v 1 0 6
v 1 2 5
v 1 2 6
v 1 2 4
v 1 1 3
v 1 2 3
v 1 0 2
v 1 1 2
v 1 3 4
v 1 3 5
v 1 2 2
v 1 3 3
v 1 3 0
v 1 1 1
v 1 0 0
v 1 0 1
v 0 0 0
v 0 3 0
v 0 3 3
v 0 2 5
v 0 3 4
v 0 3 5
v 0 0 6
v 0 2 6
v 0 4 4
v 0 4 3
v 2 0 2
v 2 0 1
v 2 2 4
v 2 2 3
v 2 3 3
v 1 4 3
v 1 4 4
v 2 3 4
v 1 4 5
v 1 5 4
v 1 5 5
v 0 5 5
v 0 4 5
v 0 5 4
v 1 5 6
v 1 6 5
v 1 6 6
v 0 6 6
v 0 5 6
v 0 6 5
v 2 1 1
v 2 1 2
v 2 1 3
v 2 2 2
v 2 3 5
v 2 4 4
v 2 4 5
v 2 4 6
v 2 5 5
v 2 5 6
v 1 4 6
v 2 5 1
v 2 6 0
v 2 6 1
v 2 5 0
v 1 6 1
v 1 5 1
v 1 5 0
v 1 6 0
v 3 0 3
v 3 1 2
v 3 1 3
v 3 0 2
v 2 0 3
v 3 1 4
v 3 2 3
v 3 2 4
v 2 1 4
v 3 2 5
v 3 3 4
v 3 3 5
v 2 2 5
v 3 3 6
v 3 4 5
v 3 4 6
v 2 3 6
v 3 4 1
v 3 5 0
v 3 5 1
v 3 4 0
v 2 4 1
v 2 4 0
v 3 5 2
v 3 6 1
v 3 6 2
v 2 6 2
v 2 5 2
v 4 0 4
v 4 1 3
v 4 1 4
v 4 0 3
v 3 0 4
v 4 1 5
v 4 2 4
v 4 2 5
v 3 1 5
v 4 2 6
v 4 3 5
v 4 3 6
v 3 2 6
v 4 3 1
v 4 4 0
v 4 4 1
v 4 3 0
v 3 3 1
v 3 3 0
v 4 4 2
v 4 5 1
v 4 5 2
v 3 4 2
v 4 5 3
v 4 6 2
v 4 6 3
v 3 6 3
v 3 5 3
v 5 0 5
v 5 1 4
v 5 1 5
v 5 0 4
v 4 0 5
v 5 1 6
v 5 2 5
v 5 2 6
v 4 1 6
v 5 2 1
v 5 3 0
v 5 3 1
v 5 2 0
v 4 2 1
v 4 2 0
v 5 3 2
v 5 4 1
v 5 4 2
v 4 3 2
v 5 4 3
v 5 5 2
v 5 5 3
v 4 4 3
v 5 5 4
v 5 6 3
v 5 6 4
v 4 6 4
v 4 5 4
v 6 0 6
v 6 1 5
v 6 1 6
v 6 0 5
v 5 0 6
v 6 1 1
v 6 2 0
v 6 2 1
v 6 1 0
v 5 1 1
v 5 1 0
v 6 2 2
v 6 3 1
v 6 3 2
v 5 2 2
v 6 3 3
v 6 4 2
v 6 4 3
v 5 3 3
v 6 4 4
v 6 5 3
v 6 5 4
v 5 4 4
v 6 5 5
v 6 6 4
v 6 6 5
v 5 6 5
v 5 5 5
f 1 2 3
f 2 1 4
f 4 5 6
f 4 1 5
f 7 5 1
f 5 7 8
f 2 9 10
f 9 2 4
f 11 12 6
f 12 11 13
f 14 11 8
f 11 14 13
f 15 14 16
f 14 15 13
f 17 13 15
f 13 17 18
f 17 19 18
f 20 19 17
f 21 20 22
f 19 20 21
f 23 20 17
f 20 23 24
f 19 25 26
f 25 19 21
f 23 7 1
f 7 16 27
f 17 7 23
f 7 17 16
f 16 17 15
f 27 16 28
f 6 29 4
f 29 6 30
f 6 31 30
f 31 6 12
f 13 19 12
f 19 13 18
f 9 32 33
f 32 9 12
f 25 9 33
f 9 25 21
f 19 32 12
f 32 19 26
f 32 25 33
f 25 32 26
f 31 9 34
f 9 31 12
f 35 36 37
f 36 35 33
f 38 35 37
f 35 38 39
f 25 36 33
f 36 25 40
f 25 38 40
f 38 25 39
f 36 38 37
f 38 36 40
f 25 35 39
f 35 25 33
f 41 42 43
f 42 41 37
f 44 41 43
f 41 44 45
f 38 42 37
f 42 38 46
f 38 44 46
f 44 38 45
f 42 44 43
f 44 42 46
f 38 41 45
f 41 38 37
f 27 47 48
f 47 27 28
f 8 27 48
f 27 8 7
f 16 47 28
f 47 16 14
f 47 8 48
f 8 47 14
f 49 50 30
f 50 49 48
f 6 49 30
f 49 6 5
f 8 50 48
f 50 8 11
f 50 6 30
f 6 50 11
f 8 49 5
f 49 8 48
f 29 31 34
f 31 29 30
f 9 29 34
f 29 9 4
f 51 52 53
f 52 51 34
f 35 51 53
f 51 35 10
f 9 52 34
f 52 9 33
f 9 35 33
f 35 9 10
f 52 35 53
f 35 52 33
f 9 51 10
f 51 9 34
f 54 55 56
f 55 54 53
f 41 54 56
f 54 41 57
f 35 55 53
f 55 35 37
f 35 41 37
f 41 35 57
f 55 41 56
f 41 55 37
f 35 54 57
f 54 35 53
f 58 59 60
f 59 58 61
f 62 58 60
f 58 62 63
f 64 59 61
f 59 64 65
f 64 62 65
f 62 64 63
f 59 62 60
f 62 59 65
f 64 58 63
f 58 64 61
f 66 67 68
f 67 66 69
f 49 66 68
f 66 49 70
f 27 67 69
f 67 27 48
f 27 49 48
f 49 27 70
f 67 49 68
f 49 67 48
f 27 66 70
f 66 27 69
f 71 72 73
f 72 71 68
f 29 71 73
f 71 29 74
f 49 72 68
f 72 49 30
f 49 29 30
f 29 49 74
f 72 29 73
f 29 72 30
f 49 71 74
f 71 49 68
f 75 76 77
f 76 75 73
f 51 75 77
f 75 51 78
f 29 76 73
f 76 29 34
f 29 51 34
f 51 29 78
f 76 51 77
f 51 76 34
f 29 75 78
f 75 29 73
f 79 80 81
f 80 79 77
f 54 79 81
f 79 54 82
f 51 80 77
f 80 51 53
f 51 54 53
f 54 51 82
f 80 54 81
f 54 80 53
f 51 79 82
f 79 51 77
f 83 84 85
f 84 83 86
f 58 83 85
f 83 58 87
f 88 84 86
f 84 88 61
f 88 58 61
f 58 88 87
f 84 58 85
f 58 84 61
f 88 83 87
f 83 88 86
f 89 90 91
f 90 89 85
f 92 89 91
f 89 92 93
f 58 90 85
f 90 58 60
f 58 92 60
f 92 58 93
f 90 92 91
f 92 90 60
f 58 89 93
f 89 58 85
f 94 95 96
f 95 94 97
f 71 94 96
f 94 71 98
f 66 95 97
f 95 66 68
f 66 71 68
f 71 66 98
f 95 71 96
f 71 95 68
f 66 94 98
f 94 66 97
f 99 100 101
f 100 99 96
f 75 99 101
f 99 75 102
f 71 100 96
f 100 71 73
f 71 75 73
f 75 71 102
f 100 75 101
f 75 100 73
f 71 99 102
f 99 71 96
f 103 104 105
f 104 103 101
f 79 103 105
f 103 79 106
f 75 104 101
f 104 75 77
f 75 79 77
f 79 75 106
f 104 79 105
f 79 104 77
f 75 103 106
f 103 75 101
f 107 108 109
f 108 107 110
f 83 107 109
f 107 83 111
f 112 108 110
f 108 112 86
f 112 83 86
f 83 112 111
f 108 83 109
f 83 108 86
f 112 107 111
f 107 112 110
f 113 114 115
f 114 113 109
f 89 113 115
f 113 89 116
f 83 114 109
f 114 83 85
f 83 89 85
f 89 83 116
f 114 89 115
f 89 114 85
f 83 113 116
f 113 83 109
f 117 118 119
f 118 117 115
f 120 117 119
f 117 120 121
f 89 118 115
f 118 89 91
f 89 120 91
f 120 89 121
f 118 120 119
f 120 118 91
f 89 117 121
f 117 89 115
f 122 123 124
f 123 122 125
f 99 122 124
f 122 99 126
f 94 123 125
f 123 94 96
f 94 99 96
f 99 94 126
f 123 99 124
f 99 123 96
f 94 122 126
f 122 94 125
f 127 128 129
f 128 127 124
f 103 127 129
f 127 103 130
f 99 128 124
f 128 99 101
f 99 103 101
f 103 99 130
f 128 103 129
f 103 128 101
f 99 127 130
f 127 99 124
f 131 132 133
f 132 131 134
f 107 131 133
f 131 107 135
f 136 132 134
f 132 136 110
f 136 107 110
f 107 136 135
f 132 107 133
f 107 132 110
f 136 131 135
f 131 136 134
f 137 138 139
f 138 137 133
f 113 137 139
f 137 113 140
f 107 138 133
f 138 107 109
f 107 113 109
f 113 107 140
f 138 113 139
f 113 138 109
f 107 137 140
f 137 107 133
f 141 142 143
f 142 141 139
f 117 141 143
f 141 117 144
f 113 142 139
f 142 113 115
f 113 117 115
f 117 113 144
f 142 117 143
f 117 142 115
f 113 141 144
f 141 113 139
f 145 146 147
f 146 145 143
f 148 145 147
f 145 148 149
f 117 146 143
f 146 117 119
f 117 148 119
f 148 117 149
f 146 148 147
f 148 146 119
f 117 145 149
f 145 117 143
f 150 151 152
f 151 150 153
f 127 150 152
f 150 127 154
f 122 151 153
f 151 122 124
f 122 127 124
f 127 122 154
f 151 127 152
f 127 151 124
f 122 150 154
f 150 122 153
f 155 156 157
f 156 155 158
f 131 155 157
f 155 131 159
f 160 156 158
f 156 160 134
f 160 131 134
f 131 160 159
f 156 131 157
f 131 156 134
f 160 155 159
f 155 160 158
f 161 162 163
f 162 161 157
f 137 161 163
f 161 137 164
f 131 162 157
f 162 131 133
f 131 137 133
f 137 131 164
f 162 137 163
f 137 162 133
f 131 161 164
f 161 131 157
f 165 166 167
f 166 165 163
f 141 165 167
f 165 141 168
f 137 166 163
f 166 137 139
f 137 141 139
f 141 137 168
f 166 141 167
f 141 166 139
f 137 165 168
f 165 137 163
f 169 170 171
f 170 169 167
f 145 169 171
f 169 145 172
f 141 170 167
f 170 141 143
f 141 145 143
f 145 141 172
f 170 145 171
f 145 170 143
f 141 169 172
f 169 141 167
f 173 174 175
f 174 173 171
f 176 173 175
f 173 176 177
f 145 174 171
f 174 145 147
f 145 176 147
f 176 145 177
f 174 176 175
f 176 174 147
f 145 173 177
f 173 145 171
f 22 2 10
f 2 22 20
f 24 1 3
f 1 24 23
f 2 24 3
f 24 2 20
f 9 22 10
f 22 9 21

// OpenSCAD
union() {
    translate([0.0, 0.0, 0.0]) cube([1, 1, 1]);
    translate([0.0, 1.0, 1.0]) cube([1, 1, 1]);
    translate([0.0, 2.0, 2.0]) cube([1, 1, 1]);
    translate([0.0, 3.0, 3.0]) cube([1, 1, 1]);
    translate([0.0, 4.0, 4.0]) cube([1, 1, 1]);
    translate([0.0, 5.0, 5.0]) cube([1, 1, 1]);
    translate([1.0, 0.0, 1.0]) cube([1, 1, 1]);
    translate([1.0, 1.0, 2.0]) cube([1, 1, 1]);
    translate([1.0, 2.0, 3.0]) cube([1, 1, 1]);
    translate([1.0, 3.0, 4.0]) cube([1, 1, 1]);
    translate([1.0, 4.0, 5.0]) cube([1, 1, 1]);
    translate([1.0, 5.0, 0.0]) cube([1, 1, 1]);
    translate([2.0, 0.0, 2.0]) cube([1, 1, 1]);
    translate([2.0, 1.0, 3.0]) cube([1, 1, 1]);
    translate([2.0, 2.0, 4.0]) cube([1, 1, 1]);
    translate([2.0, 3.0, 5.0]) cube([1, 1, 1]);
    translate([2.0, 4.0, 0.0]) cube([1, 1, 1]);
    translate([2.0, 5.0, 1.0]) cube([1, 1, 1]);
    translate([3.0, 0.0, 3.0]) cube([1, 1, 1]);
    translate([3.0, 1.0, 4.0]) cube([1, 1, 1]);
    translate([3.0, 2.0, 5.0]) cube([1, 1, 1]);
    translate([3.0, 3.0, 0.0]) cube([1, 1, 1]);
    translate([3.0, 4.0, 1.0]) cube([1, 1, 1]);
    translate([3.0, 5.0, 2.0]) cube([1, 1, 1]);
    translate([4.0, 0.0, 4.0]) cube([1, 1, 1]);
    translate([4.0, 1.0, 5.0]) cube([1, 1, 1]);
    translate([4.0, 2.0, 0.0]) cube([1, 1, 1]);
    translate([4.0, 3.0, 1.0]) cube([1, 1, 1]);
    translate([4.0, 4.0, 2.0]) cube([1, 1, 1]);
    translate([4.0, 5.0, 3.0]) cube([1, 1, 1]);
    translate([5.0, 0.0, 5.0]) cube([1, 1, 1]);
    translate([5.0, 1.0, 0.0]) cube([1, 1, 1]);
    translate([5.0, 2.0, 1.0]) cube([1, 1, 1]);
    translate([5.0, 3.0, 2.0]) cube([1, 1, 1]);
    translate([5.0, 4.0, 3.0]) cube([1, 1, 1]);
    translate([5.0, 5.0, 4.0]) cube([1, 1, 1]);
    translate([0.0, 0.0, 1.0]) cube([1, 1, 1]);
    translate([0.0, 0.0, 2.0]) cube([1, 1, 1]);
    translate([0.0, 0.0, 3.0]) cube([1, 1, 1]);
    translate([0.0, 0.0, 4.0]) cube([1, 1, 1]);
    translate([0.0, 0.0, 5.0]) cube([1, 1, 1]);
    translate([0.0, 1.0, 0.0]) cube([1, 1, 1]);
    translate([0.0, 1.0, 2.0]) cube([1, 1, 1]);
    translate([0.0, 1.0, 3.0]) cube([1, 1, 1]);
    translate([0.0, 1.0, 4.0]) cube([1, 1, 1]);
    translate([0.0, 1.0, 5.0]) cube([1, 1, 1]);
    translate([0.0, 2.0, 0.0]) cube([1, 1, 1]);
    translate([0.0, 2.0, 1.0]) cube([1, 1, 1]);
    translate([0.0, 2.0, 3.0]) cube([1, 1, 1]);
    translate([0.0, 2.0, 4.0]) cube([1, 1, 1]);
}
